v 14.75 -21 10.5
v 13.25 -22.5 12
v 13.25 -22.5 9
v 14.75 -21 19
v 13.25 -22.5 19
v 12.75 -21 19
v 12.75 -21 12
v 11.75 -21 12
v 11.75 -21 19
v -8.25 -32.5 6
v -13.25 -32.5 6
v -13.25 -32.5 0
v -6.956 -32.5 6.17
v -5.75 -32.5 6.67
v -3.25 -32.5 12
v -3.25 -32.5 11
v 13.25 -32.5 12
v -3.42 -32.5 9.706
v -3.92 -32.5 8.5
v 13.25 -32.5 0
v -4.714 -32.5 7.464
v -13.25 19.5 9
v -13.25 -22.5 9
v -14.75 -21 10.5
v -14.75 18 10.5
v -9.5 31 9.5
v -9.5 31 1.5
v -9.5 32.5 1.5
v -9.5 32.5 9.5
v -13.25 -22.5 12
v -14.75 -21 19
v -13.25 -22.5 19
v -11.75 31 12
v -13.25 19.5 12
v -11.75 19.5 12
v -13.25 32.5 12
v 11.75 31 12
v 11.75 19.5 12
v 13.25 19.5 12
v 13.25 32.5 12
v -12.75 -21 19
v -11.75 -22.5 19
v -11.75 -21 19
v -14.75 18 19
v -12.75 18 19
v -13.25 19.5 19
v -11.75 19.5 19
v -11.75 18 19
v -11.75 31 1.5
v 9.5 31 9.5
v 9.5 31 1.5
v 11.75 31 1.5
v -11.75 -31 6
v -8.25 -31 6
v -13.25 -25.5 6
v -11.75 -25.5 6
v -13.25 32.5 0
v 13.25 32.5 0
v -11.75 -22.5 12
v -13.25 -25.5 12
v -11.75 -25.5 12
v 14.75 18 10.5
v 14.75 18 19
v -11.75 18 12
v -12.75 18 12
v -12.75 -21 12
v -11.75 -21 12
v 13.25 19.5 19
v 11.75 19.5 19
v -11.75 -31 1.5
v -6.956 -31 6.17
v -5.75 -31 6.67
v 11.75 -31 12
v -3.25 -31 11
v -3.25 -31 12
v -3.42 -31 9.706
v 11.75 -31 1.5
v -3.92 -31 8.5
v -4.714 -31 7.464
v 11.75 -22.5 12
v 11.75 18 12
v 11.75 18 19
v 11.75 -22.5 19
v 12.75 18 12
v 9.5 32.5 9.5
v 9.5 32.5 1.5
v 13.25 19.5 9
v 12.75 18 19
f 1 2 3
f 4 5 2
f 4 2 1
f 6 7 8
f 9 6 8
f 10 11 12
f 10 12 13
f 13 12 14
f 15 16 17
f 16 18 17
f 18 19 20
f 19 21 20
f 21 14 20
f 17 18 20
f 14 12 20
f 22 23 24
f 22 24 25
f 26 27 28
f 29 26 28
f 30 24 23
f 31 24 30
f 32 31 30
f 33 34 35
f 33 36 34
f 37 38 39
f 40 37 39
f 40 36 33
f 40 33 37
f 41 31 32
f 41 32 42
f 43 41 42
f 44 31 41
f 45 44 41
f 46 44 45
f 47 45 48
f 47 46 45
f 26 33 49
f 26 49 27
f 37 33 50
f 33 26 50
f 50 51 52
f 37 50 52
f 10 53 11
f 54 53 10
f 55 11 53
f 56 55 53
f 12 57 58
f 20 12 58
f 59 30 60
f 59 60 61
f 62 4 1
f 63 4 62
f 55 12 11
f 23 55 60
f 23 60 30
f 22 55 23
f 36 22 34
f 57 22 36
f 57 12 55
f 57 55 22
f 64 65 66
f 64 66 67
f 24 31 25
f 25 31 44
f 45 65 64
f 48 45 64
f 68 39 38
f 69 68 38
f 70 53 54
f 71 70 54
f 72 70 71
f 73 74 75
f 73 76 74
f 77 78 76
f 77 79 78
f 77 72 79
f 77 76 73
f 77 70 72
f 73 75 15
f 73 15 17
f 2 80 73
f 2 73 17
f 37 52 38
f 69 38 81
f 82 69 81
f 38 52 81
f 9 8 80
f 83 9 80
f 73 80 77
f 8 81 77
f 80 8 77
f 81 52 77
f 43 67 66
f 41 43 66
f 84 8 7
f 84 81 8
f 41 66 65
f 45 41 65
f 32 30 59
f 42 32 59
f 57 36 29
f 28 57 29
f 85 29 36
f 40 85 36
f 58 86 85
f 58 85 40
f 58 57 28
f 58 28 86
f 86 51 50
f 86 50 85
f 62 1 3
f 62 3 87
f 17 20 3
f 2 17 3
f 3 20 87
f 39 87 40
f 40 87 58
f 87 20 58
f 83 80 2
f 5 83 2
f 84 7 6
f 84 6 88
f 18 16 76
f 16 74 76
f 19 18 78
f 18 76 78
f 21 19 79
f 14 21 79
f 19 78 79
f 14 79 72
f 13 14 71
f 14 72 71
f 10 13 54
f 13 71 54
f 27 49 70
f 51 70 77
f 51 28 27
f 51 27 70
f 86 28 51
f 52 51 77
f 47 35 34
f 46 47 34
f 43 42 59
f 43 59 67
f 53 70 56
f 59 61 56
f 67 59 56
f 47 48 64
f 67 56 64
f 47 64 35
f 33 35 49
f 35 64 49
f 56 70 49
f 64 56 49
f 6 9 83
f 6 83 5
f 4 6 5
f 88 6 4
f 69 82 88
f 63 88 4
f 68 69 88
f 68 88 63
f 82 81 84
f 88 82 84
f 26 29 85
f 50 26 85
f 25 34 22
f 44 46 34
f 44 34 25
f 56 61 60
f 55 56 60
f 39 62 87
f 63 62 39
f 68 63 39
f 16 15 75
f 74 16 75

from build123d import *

# Parameters (mm, degrees)
F0_W      = 23.5
F0_H      = 62
F1_DEPTH  = 1.5
F2_W      = 26.5
F2_H      = 65
F2_W_2    = 23.5
F2_H_2    = 62
F3_DEPTH  = 12
F4_W      = 2
F4_H      = 39
F5_DEPTH  = 7
F7_DEPTH  = 7
F8_W      = 19
F8_H      = 5
F9_DEPTH  = 8
F11_DEPTH = 6
F12_R     = 5
F13_DEPTH = 3
F14_SIZE  = 1.49999


# Not quite as in the source:
# - a fillet or chamfer is up to 0.001 mm smaller than in the source, because OpenCascade refuses the exact size


with BuildPart() as f1:
    # F0 (on Top) → F1 (new body)
    with BuildSketch(Plane.XY):
        Rectangle(F0_W, F0_H)
    extrude(amount=F1_DEPTH)

    # F2 (on Top) → F3 (join)
    with BuildSketch(Plane.XY):
        Rectangle(F2_W, F2_H)
        Rectangle(F2_W_2, F2_H_2, mode=Mode.SUBTRACT)
    extrude(amount=F3_DEPTH)

    # F4 (on face) → F5 (join)
    with BuildSketch(Plane.XY.offset(12)):
        with Locations((-13.75, -1.5)):
            Rectangle(F4_W, F4_H)
        with Locations((13.75, -1.5)):
            Rectangle(F4_W, F4_H)
    extrude(amount=F5_DEPTH)

    # F6 (on face) → F7 (join, through all)
    with BuildSketch(Plane.XY.offset(12)):
        Polygon((14.75, -21), (11.75, -21), (11.75, -22.5), (13.25, -22.5), align=None)
        Polygon((11.75, 19.5), (11.75, 18), (14.75, 18), (13.25, 19.5), align=None)
        Polygon((-13.25, 19.5), (-14.75, 18), (-11.75, 18), (-11.75, 19.5), align=None)
        Polygon((-11.75, -22.5), (-11.75, -21), (-14.75, -21), (-13.25, -22.5), align=None)
    extrude(amount=F7_DEPTH)

    # F8 (on face) → F9 (cut)
    with BuildSketch(Plane.XY.offset(1.5)):
        with Locations((0, 31)):
            Rectangle(F8_W, F8_H)
    extrude(amount=F9_DEPTH, mode=Mode.SUBTRACT)

    # F10 (on face) → F11 (cut)
    with BuildSketch(Plane.XY.offset(12)):
        Polygon((-13.25, -25.5), (-13.25, -32.5), (-3.25, -32.5), (-3.25, -31), (-11.75, -31), (-11.75, -25.5), align=None)
    extrude(amount=-F11_DEPTH, mode=Mode.SUBTRACT)

    # F12
    f12_edges = [f1.edges().sort_by_distance(p)[0] for p in [
        (-3.25, -31.75, 6),
    ]]
    fillet(f12_edges, radius=F12_R)

    # F13 (add): faces of the model
    f13_faces = [f1.faces().sort_by_distance(p)[0] for p in [
        (-13.9907407407, -1.5, 12),
        (13.9907407407, -1.5, 12),
    ]]
    extrude(f13_faces, amount=F13_DEPTH)

    # F14 (size 1.5 in the source; OpenCascade refuses exactly that, so slightly less here)
    f14_edges = [f1.edges().sort_by_distance(p)[0] for p in [
        (-14.75, -1.5, 9),
        (14.75, -1.5, 9),
    ]]
    chamfer(f14_edges, length=F14_SIZE)


solid = f1.part
